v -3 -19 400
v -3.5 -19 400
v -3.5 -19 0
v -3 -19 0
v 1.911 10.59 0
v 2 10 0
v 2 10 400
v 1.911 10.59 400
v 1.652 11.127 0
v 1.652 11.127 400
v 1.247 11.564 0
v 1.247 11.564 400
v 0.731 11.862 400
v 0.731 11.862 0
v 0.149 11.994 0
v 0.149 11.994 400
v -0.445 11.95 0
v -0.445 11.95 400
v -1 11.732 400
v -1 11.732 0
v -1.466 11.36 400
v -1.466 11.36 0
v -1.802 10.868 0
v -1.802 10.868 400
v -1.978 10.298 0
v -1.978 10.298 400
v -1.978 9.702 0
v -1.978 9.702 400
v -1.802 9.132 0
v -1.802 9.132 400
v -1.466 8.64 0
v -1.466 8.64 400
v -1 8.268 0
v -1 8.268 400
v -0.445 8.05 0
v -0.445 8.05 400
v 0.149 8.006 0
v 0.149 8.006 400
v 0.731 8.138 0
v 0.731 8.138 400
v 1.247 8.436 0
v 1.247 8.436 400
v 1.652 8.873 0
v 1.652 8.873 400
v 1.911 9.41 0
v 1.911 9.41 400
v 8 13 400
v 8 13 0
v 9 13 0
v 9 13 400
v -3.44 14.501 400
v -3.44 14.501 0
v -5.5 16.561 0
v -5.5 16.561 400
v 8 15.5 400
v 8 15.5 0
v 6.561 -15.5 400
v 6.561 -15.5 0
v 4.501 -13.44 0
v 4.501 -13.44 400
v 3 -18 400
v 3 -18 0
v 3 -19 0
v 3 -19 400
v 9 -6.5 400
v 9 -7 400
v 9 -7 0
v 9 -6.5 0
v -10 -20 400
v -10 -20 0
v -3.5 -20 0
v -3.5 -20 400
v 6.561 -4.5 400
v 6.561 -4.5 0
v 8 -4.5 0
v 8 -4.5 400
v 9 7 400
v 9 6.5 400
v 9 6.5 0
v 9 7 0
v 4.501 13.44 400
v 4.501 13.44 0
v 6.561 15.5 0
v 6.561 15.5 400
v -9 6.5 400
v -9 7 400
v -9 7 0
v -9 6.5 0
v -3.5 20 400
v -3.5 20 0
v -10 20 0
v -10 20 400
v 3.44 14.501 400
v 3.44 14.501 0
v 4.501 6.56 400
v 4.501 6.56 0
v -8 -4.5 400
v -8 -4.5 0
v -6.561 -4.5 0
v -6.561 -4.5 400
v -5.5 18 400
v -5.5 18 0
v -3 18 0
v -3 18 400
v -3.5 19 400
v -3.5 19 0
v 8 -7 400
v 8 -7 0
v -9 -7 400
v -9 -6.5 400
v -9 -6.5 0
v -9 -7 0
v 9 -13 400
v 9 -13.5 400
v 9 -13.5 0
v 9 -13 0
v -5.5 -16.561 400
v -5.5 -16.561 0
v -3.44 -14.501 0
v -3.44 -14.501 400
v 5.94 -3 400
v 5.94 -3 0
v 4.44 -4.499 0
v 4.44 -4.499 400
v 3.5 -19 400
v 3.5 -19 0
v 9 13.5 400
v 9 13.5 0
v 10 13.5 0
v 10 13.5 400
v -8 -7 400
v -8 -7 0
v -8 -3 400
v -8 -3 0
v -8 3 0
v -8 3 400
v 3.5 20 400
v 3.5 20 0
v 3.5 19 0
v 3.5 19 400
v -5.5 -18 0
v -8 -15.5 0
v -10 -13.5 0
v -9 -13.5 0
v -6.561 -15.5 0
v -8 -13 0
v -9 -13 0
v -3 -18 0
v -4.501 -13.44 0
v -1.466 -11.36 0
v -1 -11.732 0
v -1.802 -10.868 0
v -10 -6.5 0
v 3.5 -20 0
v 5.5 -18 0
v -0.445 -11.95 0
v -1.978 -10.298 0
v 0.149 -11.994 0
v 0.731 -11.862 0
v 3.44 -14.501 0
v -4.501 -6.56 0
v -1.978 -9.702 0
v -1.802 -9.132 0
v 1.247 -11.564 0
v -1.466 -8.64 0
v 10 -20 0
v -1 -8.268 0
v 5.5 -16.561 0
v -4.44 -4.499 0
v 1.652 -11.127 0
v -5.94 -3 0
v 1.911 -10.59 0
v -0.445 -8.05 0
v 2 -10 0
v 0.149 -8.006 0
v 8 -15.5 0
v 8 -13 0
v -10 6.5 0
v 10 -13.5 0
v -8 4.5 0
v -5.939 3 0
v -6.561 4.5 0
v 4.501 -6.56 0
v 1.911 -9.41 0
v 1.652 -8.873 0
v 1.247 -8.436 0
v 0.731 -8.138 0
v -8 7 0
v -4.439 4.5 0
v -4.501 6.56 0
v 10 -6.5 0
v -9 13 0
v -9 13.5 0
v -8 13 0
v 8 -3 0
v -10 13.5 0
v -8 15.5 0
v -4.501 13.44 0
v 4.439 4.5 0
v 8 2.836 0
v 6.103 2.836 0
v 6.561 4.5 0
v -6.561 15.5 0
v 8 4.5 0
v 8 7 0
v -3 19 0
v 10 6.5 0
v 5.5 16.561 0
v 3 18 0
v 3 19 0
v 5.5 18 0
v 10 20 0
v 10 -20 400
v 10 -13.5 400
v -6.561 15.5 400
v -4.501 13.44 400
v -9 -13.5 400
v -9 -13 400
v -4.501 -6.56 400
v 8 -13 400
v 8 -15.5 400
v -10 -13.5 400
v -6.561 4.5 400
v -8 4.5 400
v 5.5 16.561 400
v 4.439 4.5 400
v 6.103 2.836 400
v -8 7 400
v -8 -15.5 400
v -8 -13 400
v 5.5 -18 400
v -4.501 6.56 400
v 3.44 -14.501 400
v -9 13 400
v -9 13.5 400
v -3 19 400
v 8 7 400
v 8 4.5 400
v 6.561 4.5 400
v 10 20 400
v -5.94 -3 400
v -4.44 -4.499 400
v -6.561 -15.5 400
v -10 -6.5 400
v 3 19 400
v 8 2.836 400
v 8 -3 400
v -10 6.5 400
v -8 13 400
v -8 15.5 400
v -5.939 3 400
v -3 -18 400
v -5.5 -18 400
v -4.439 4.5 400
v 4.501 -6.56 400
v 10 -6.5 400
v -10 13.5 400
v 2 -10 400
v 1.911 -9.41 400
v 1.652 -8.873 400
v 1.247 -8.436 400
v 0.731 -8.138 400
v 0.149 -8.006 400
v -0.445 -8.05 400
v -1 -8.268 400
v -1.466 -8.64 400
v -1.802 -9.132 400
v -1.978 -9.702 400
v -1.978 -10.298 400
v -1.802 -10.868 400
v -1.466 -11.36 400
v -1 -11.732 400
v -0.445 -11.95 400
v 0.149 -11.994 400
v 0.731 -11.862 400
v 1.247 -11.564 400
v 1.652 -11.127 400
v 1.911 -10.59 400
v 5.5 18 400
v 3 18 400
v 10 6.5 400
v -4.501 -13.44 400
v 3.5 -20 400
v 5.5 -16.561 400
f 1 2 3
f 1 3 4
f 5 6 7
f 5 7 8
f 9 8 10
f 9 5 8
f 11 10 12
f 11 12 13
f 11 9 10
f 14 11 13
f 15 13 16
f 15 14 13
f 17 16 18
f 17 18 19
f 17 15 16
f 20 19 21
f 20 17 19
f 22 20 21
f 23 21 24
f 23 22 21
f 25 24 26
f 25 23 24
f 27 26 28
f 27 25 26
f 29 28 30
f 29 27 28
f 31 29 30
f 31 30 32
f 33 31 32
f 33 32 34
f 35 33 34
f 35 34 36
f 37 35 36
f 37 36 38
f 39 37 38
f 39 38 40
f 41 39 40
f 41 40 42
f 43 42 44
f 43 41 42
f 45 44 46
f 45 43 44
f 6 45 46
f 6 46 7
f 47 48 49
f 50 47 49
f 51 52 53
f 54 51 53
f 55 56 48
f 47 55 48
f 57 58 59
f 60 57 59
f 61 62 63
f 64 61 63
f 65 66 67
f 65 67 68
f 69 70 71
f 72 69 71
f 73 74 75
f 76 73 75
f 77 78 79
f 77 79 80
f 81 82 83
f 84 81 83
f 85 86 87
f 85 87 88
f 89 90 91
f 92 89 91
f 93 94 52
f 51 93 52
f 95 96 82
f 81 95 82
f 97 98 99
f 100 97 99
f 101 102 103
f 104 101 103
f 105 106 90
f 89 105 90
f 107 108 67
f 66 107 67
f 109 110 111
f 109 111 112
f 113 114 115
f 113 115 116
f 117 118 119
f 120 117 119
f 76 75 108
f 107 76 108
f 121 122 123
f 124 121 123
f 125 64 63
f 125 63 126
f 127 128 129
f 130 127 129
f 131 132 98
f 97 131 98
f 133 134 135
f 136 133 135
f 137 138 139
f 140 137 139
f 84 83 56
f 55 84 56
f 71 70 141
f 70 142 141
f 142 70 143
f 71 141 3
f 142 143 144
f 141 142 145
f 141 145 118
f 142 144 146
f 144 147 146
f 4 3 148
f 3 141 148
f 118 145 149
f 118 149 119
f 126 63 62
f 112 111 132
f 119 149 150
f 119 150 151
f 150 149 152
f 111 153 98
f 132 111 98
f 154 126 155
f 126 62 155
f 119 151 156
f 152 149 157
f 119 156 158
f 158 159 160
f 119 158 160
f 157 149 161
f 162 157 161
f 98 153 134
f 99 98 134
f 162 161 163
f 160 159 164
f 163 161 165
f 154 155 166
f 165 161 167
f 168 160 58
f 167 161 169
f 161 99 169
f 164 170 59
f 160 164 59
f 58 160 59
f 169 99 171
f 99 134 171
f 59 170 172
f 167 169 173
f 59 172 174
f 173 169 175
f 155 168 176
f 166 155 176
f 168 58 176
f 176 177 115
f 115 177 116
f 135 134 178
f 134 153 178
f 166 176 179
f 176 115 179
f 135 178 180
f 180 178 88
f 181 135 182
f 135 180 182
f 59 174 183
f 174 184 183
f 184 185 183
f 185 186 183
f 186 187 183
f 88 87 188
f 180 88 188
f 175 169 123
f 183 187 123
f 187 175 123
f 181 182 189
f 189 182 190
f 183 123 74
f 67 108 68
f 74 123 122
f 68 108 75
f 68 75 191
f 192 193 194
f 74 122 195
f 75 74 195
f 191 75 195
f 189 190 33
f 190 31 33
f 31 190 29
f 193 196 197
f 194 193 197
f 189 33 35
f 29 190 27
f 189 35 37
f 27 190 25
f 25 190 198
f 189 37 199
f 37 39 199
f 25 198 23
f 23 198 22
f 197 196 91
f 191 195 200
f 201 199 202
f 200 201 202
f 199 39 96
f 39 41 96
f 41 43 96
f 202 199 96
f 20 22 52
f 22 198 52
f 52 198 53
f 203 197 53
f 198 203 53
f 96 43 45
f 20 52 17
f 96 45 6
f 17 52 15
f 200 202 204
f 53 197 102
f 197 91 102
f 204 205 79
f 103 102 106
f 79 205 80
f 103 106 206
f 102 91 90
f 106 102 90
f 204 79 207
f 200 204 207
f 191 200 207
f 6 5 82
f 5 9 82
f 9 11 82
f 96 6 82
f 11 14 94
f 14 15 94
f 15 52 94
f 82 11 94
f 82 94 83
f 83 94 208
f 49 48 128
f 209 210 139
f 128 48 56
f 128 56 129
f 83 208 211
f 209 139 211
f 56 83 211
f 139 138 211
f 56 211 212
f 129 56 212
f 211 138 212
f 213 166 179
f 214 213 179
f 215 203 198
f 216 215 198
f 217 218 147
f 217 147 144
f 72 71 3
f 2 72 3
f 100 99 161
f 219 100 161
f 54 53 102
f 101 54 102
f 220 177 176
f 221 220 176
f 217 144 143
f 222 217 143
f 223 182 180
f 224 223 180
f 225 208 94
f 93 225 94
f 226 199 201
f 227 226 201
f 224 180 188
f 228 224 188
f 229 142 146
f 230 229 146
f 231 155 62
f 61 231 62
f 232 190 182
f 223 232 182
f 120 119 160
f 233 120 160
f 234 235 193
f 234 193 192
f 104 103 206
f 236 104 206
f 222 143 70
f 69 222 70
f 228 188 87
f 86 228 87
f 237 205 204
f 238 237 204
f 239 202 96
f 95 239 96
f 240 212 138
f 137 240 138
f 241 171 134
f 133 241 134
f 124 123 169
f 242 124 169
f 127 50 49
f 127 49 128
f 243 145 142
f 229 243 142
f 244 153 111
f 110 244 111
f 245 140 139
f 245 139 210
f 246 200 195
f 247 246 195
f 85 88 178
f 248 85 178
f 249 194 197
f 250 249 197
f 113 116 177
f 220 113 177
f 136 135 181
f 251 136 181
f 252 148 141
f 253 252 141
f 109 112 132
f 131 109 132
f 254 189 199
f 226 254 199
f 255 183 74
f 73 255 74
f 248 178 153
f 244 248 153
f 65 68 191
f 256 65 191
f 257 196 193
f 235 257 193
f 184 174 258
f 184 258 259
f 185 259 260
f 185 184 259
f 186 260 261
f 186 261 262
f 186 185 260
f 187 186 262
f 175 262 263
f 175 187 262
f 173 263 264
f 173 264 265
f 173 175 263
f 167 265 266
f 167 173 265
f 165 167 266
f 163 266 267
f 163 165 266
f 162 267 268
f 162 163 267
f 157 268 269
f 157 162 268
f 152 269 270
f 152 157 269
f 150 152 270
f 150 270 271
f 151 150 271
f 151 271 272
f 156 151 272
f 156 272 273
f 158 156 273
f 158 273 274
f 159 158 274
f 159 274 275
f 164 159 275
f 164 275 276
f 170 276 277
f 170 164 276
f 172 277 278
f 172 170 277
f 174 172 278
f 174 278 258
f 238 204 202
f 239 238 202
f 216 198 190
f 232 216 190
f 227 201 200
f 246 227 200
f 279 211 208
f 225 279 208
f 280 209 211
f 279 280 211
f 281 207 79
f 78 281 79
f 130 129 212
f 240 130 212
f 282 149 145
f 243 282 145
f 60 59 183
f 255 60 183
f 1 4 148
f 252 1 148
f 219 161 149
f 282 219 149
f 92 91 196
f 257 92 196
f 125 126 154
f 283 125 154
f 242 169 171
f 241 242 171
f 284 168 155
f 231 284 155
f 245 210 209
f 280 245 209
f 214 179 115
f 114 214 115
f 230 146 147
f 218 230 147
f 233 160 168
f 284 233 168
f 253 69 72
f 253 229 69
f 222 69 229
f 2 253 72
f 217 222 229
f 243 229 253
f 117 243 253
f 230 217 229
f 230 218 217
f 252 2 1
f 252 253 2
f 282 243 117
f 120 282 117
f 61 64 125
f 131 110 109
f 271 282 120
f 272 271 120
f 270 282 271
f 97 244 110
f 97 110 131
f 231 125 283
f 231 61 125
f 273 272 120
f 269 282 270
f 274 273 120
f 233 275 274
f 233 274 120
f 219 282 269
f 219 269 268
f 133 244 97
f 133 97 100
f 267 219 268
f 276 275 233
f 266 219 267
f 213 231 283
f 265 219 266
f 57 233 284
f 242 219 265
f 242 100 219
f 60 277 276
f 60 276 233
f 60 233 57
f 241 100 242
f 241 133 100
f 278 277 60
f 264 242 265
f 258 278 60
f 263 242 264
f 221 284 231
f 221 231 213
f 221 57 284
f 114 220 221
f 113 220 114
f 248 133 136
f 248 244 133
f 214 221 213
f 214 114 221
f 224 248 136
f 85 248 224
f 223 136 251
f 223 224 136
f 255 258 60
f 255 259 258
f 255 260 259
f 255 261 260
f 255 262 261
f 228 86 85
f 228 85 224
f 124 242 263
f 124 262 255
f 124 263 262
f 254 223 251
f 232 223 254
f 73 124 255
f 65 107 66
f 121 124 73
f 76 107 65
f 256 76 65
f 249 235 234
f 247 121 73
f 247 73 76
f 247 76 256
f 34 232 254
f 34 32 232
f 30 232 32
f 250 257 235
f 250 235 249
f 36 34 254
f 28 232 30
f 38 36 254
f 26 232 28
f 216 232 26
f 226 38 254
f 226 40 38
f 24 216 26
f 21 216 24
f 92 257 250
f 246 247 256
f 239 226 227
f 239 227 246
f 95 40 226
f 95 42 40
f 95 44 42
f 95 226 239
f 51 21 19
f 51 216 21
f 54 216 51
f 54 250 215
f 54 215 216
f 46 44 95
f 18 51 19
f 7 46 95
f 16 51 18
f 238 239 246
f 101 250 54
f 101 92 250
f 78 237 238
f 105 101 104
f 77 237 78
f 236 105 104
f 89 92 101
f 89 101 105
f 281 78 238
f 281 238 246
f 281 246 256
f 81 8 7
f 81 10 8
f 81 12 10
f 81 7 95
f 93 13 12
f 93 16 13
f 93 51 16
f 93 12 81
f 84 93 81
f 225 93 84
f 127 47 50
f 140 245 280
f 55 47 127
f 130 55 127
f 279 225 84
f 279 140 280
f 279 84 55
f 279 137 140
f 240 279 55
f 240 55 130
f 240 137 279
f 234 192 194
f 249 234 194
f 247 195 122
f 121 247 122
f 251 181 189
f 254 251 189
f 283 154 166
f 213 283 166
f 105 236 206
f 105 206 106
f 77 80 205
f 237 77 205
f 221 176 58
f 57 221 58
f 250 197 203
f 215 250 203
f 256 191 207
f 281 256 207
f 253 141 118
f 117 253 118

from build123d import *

# Parameters (mm, degrees)
SKETCH1_R           = 2
BOSS_EXTRUDE1_DEPTH = 400


with BuildPart() as part:
    # Sketch1 → Boss-Extrude1 (new body)
    with BuildSketch(Plane.XY):
        Polygon((-10, -20), (-3.5, -20), (-3.5, -19), (-3, -19), (-3, -18), (-5.5, -18), (-5.5, -16.560660172), (-3.44, -14.500660172), (3.44, -14.500660172), (5.5, -16.560660172), (5.5, -18), (3, -18), (3, -19), (3.5, -19), (3.5, -20), (10, -20), (10, -13.5), (9, -13.5), (9, -13), (8, -13), (8, -15.5), (6.560660172, -15.5), (4.500660172, -13.44), (4.500660172, -6.56), (6.560660172, -4.5), (8, -4.5), (8, -7), (9, -7), (9, -6.5), (10, -6.5), (10, 6.5), (9, 6.5), (9, 7), (8, 7), (8, 4.5), (6.560660172, 4.5), (4.500660172, 6.56), (4.500660172, 13.44), (6.560660172, 15.5), (8, 15.5), (8, 13), (9, 13), (9, 13.5), (10, 13.5), (10, 20), (3.5, 20), (3.5, 19), (3, 19), (3, 18), (5.5, 18), (5.5, 16.560660172), (3.44, 14.500660172), (-3.44, 14.500660172), (-5.5, 16.560660172), (-5.5, 18), (-3, 18), (-3, 19), (-3.5, 19), (-3.5, 20), (-10, 20), (-10, 13.5), (-9, 13.5), (-9, 13), (-8, 13), (-8, 15.5), (-6.560660172, 15.5), (-4.500660172, 13.44), (-4.500660172, 6.56), (-6.560660172, 4.5), (-8, 4.5), (-8, 7), (-9, 7), (-9, 6.5), (-10, 6.5), (-10, -6.5), (-9, -6.5), (-9, -7), (-8, -7), (-8, -4.5), (-6.560660172, -4.5), (-4.500660172, -6.56), (-4.500660172, -13.44), (-6.560660172, -15.5), (-8, -15.5), (-8, -13), (-9, -13), (-9, -13.5), (-10, -13.5), align=None)
        with Locations((0, 10)):
            Circle(SKETCH1_R, mode=Mode.SUBTRACT)
        with Locations((0, -10)):
            Circle(SKETCH1_R, mode=Mode.SUBTRACT)
        Polygon((-4.439339828, 4.5), (4.439339828, 4.5), (6.103256126, 2.836083702), (8, 2.836083702), (8, -2.999669914), (5.939669914, -2.999669914), (4.44, -4.499339828), (-4.44, -4.499339828), (-5.939669914, -2.999669914), (-8, -2.999669914), (-8, 3.000330086), (-5.939009742, 3.000330086), align=None, mode=Mode.SUBTRACT)
    extrude(amount=BOSS_EXTRUDE1_DEPTH)


solid = part.part
